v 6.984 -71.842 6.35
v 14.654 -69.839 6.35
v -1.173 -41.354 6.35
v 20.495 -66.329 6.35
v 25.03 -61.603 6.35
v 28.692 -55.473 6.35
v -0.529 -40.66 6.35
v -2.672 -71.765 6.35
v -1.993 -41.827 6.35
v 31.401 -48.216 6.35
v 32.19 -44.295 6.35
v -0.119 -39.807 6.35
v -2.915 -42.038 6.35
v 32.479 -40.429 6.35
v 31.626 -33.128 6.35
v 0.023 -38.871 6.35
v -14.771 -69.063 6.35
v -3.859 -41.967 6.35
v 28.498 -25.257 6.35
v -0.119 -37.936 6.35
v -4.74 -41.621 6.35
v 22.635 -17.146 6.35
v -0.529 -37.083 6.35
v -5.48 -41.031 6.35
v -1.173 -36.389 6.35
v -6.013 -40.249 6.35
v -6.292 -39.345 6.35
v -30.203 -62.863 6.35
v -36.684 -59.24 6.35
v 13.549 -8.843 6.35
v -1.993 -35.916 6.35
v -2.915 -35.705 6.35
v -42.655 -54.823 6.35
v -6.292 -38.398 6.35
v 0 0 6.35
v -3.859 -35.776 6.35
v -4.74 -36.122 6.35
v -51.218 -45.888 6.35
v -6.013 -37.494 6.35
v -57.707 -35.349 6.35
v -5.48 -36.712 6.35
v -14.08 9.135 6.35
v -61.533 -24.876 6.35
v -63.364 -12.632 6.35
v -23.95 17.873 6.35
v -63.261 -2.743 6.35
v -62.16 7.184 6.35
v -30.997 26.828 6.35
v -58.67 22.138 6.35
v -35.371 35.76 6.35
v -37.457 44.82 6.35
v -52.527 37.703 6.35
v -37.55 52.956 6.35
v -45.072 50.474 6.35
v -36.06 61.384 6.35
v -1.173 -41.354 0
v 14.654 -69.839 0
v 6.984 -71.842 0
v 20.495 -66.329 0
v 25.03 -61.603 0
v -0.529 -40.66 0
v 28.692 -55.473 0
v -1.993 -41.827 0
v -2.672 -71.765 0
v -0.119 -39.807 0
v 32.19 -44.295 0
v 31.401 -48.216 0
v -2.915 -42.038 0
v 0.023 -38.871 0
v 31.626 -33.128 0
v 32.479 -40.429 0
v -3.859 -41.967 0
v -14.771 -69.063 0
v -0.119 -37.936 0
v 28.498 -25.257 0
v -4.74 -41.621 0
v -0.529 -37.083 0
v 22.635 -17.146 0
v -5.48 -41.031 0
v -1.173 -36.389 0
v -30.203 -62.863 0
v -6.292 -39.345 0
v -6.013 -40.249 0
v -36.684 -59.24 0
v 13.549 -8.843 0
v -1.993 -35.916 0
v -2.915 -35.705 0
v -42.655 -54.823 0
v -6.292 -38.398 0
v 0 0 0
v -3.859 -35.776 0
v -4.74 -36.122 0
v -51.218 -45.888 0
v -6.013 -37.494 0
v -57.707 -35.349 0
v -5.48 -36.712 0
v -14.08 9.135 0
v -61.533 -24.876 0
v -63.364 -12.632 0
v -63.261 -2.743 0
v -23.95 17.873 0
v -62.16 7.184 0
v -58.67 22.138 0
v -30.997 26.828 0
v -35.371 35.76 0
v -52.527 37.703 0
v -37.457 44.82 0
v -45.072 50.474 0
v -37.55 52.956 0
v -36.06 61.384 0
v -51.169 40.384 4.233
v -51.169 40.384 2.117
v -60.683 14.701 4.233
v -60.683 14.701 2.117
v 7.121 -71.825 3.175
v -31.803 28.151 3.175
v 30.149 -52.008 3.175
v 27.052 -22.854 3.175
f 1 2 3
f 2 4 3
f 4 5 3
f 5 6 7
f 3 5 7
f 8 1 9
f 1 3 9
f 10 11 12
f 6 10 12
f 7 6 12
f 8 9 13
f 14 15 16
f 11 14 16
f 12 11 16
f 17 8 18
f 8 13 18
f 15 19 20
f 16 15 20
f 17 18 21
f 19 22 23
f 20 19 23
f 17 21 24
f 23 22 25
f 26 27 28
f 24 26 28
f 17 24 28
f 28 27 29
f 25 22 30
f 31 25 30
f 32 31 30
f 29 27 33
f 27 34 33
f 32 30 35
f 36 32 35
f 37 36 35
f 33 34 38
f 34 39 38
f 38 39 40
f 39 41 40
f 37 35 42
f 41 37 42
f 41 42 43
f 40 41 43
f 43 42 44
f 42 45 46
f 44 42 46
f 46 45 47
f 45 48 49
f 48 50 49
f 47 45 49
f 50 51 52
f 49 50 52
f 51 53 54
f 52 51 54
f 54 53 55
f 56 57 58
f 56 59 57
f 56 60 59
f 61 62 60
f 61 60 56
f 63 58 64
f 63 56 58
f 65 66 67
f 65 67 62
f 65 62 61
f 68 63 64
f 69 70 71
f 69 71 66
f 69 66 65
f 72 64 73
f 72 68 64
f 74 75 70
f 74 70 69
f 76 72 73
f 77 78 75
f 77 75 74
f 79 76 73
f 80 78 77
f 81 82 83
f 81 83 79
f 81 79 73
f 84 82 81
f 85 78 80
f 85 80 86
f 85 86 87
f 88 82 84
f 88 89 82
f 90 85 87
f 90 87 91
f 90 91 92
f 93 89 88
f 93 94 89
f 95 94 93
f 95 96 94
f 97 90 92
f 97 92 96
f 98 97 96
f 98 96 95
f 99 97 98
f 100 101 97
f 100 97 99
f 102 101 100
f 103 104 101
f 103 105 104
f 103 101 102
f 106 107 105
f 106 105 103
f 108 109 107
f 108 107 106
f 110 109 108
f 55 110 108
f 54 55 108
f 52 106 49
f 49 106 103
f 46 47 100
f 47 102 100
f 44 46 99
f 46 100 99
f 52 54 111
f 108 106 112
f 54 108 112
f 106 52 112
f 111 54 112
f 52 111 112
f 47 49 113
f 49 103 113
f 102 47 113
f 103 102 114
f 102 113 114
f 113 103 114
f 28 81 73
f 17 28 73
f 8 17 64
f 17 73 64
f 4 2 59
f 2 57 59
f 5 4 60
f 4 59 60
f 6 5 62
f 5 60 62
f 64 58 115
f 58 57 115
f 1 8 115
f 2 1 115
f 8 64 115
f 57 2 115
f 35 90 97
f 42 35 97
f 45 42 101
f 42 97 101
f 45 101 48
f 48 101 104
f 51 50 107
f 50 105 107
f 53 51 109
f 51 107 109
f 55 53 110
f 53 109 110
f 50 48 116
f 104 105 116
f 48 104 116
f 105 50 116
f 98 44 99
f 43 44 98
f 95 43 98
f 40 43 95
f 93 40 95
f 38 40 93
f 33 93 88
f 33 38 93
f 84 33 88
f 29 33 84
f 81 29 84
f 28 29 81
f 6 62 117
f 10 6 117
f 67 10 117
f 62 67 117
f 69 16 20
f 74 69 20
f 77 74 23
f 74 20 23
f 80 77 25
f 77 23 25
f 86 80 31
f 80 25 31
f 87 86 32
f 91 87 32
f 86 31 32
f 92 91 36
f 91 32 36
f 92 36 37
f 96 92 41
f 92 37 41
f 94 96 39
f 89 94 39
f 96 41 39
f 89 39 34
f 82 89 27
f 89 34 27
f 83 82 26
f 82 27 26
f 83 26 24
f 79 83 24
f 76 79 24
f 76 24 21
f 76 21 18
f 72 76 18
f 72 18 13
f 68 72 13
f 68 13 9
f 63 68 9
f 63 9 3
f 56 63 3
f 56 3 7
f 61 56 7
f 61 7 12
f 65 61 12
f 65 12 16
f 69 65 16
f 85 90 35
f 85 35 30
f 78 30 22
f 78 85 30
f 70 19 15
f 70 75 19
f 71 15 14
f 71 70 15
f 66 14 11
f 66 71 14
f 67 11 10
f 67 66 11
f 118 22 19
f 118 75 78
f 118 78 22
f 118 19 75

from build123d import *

# Parameters (mm, degrees)
BOSS_EXTRUDE1_DEPTH = 6.35
SKETCH2_R           = 3.175
CUT_EXTRUDE1_DEPTH  = 76.2
FILLET1_R           = 58.42


with BuildPart() as part:
    # Sketch1 → Boss-Extrude1 (new body)
    with BuildSketch(Plane.XY):
        with BuildLine():
            add(Edge.make_bspline(
                [(0, 0), (38.404098046, -21.59977719), (31.400899659, -48.21557496)],
                knots=[0, 0, 0, 0.881342447, 0.881342447, 0.881342447], degree=2))
            add(Edge.make_bspline(
                [(0, 0), (-45.575290821, 25.610850897), (-36.060387995, 61.383694171)],
                knots=[0, 0, 0, 1, 1, 1], degree=2))
            add(Edge.make_bspline(
                [(-36.060387995, 61.383694171), (-62.615286542, 34.594392179), (-74.116408577, -18.870814993), (-51.051785251, -51.254371701)],
                knots=[0, 0, 0, 0, 1, 1, 1, 1], degree=3))
            add(Edge.make_bspline(
                [(-51.051785251, -51.254371701), (12.058894693, -90.706625614), (28.692128455, -55.473211038)],
                knots=[0, 0, 0, 0.914335656, 0.914335656, 0.914335656], degree=2))
            add(Edge.make_bspline(
                [(28.692128455, -55.473211038), (30.250500418, -52.172183336), (31.400899659, -48.21557496)],
                knots=[0.914335656, 0.914335656, 0.914335656, 1, 1, 1], degree=2))
        make_face()
    extrude(amount=BOSS_EXTRUDE1_DEPTH)

    # Sketch2 → Cut-Extrude1 (cut)
    with BuildSketch(Plane.XY.offset(6.35)):
        with Locations((-3.152469771, -38.871385351)):
            Circle(SKETCH2_R)
    extrude(amount=-CUT_EXTRUDE1_DEPTH, mode=Mode.SUBTRACT)

    # Fillet1
    fillet1_edges = [part.edges().sort_by_distance(p)[0] for p in [
        (-51.051785251, -51.254371701, 3.175),
    ]]
    fillet(fillet1_edges, radius=FILLET1_R)


solid = part.part
